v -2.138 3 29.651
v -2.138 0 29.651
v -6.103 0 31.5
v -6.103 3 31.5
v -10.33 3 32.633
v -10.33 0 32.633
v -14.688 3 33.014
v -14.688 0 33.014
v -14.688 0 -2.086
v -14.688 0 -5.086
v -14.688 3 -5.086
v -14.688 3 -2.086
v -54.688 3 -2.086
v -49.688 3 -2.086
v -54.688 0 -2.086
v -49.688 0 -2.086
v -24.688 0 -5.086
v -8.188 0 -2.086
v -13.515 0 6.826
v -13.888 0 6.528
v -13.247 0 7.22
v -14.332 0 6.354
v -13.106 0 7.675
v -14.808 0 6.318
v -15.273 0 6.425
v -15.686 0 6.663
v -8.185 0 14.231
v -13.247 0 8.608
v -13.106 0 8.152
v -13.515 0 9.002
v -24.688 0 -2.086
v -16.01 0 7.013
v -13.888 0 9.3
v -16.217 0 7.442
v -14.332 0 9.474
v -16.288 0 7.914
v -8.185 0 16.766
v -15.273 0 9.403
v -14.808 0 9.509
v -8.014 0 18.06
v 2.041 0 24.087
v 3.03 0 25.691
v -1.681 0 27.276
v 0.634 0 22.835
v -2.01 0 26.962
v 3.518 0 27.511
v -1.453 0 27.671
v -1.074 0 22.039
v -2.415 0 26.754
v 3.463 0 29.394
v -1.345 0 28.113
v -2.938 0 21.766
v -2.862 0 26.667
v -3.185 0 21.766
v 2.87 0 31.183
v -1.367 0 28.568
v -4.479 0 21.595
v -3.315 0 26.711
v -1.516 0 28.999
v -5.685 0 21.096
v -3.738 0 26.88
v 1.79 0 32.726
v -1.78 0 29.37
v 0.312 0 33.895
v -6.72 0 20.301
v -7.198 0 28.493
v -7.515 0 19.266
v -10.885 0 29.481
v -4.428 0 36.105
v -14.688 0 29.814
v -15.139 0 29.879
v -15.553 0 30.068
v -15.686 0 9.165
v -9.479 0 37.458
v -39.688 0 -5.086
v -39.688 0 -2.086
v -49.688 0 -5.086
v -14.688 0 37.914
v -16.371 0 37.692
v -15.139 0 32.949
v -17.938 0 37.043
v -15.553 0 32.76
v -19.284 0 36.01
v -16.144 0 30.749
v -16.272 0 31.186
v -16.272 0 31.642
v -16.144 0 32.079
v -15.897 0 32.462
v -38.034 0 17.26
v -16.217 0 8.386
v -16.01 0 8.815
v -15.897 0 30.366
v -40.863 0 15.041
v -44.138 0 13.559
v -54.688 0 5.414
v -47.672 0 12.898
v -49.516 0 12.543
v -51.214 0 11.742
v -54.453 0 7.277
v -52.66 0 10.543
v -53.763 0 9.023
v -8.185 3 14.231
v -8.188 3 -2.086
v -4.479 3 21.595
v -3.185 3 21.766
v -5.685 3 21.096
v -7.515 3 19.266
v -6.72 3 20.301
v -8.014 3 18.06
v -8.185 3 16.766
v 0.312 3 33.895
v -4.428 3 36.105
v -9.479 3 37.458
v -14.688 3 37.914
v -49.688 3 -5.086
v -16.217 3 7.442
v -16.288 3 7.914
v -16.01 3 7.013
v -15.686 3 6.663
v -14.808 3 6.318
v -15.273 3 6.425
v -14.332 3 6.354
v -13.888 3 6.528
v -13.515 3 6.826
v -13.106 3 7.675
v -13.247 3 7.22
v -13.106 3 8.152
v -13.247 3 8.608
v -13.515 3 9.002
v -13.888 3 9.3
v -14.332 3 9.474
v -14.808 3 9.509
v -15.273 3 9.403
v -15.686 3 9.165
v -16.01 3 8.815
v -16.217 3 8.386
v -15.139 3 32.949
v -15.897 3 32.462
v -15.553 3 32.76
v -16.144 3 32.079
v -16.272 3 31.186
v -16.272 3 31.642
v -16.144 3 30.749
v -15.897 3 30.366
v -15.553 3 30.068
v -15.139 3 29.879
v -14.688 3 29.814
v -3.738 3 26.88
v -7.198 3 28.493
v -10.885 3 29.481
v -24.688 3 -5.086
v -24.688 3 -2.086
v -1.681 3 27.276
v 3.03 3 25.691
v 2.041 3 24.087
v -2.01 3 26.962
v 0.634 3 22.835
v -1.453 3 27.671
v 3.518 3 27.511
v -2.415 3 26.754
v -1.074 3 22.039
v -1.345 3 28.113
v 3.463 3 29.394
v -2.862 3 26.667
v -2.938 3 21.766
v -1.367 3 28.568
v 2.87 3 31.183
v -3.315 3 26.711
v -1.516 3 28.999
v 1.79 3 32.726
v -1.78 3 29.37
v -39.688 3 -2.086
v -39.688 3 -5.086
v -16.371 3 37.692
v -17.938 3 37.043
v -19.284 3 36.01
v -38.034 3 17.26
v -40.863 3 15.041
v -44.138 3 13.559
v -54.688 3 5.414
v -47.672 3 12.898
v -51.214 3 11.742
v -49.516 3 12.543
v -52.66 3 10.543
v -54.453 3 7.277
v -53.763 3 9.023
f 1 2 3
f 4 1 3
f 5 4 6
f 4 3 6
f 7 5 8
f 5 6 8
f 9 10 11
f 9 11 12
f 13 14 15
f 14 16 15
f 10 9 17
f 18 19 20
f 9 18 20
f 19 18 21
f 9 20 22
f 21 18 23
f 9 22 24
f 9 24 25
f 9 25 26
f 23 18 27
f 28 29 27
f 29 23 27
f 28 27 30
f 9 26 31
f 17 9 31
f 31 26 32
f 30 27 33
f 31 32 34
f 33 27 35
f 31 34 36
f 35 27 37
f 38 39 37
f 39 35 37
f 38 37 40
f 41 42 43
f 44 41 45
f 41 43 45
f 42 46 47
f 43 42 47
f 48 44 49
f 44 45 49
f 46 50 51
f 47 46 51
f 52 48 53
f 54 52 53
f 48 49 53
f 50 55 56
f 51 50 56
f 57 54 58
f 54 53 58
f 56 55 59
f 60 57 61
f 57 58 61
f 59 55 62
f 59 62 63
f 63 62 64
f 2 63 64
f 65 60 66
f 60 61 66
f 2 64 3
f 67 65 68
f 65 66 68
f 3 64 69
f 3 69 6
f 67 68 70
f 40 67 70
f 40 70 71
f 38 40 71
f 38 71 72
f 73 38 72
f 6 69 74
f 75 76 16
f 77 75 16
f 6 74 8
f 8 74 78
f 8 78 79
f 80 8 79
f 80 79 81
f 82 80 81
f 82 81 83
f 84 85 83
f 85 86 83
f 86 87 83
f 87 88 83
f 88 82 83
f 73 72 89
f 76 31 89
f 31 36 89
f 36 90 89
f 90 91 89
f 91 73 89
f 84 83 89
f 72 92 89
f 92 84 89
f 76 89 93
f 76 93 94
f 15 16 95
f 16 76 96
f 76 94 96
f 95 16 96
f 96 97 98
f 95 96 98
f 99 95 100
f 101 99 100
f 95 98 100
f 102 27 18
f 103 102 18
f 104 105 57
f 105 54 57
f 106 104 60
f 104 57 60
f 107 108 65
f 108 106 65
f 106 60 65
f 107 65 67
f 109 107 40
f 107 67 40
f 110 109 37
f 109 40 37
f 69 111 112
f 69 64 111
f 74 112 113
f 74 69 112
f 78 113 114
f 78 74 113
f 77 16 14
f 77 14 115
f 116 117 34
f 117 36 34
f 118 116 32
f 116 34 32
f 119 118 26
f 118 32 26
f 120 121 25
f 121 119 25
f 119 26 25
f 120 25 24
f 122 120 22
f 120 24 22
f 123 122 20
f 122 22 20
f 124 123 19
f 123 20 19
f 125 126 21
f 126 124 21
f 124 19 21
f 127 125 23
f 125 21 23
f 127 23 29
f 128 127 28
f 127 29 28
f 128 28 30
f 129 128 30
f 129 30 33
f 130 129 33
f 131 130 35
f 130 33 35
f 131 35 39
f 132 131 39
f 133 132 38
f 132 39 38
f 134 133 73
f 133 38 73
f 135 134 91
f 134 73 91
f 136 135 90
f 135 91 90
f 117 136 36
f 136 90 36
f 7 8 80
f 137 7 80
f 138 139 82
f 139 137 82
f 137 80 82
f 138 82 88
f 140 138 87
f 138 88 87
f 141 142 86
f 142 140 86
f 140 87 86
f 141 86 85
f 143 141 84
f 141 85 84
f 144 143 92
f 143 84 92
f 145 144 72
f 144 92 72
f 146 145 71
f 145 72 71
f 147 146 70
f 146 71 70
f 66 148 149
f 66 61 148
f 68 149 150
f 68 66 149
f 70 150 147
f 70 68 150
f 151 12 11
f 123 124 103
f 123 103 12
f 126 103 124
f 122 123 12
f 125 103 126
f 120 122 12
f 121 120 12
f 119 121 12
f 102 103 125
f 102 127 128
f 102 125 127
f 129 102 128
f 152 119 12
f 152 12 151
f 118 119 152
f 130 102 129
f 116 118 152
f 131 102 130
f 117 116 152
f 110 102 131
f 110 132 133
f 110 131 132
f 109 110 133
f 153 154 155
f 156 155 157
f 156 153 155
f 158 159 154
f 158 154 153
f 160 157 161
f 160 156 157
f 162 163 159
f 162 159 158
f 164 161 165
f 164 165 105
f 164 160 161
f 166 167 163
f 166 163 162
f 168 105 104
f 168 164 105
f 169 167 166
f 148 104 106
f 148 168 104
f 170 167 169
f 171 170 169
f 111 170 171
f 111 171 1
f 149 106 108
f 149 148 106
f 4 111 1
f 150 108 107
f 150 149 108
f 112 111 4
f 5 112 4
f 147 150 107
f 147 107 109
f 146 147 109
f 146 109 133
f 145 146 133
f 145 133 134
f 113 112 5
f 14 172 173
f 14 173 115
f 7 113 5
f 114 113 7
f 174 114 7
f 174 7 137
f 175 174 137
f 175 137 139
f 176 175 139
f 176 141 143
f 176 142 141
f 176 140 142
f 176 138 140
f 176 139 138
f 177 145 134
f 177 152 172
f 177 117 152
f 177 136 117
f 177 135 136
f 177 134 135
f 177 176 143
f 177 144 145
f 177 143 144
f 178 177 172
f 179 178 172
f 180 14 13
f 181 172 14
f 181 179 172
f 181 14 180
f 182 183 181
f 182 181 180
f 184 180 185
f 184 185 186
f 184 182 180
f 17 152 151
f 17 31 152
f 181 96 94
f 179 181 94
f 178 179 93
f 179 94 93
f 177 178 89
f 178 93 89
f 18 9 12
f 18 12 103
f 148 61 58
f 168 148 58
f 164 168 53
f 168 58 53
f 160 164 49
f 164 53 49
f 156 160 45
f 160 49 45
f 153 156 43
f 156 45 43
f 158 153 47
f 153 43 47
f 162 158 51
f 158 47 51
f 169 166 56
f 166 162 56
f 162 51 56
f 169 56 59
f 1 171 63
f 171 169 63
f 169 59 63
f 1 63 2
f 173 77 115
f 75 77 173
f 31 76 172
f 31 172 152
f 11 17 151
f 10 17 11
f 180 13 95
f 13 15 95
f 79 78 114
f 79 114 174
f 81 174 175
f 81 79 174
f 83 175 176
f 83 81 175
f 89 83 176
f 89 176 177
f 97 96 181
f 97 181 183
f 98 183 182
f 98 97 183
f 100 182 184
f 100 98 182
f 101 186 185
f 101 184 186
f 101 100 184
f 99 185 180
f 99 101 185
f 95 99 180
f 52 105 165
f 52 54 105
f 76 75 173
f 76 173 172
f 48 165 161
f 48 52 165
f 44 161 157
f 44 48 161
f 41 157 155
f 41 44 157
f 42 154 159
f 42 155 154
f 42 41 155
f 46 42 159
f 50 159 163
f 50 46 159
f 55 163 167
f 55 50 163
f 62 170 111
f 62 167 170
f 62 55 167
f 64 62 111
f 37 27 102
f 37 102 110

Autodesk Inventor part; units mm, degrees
ref_plane "YZ Plane" through (0, 0, 0) normal (1, 0, 0) x (0, 1, 0)
ref_plane "XZ Plane" through (0, 0, 0) normal (0, 1, 0) x (-1, 0, 0)
ref_plane "XY Plane" through (0, 0, 0) normal (0, 0, 1) x (1, 0, 0)
sketch "Sketch1" plane through (0, 0, 0) normal (0, 1, 0) x (-1, 0, 0)
  arc A0 (14.6882, 29.8139) -> (14.6882, 33.0139) centre (14.6882, 31.4139) ccw
  circle A1 centre (14.6882, 7.9139) radius 1.6
  line L0 (14.6882, -2.0861) -> (8.1882, -2.0861)
  arc A2 (14.6882, 29.8139) -> (3.7382, 26.8799) centre (14.6882, 7.9139) ccw
  arc A3 (14.6882, 33.0139) -> (2.1382, 29.6511) centre (14.6882, 7.9139) ccw
  arc A4 (14.6882, 37.9139) -> (-0.3118, 33.8947) centre (14.6882, 7.9139) ccw
  line L1 (24.6882, -2.0861) -> (24.6882, -5.0861)
  line L2 (24.6882, -5.0861) -> (14.6882, -5.0861)
  line L3 (14.6882, -5.0861) -> (14.6882, -2.0861)
  line L4 (8.1846, 14.2314) -> (8.1882, -2.0861)
  line L5 (39.6882, -2.0861) -> (24.6882, -2.0861)
  line L6 (49.6882, -2.0861) -> (49.6882, -5.0861)
  line L7 (49.6882, -5.0861) -> (39.6882, -5.0861)
  line L8 (39.6882, -5.0861) -> (39.6882, -2.0861)
  line L9 (49.6882, -2.0861) -> (54.6882, -2.0861)
  arc A5 (2.1382, 29.6511) -> (3.7382, 26.8799) centre (2.9382, 28.2655) ccw
  arc A6 (-0.3118, 33.8947) -> (2.9382, 21.7655) centre (2.9382, 28.2655) ccw
  line L10 (8.1846, 14.2314) -> (8.1846, 16.7655)
  arc A7 (8.1846, 16.7655) -> (3.1846, 21.7655) centre (3.1846, 16.7655) ccw
  line L11 (3.1846, 21.7655) -> (2.9382, 21.7655)
  arc A8 (19.2844, 36.0101) -> (14.6882, 37.9139) centre (14.6882, 31.4139) ccw
  line L12 (54.6882, -2.0861) -> (54.6882, 5.4139)
  arc A9 (54.6882, 5.4139) -> (47.6724, 12.8983) centre (47.1882, 5.4139) ccw
  arc A10 (38.0341, 17.2604) -> (47.6724, 12.8983) centre (48.6407, 27.867) ccw
  line L13 (19.2844, 36.0101) -> (38.0341, 17.2604)
extrude "Extrusion1" add sketch "Sketch1" along normal blind 3
properties part number "camMount"
